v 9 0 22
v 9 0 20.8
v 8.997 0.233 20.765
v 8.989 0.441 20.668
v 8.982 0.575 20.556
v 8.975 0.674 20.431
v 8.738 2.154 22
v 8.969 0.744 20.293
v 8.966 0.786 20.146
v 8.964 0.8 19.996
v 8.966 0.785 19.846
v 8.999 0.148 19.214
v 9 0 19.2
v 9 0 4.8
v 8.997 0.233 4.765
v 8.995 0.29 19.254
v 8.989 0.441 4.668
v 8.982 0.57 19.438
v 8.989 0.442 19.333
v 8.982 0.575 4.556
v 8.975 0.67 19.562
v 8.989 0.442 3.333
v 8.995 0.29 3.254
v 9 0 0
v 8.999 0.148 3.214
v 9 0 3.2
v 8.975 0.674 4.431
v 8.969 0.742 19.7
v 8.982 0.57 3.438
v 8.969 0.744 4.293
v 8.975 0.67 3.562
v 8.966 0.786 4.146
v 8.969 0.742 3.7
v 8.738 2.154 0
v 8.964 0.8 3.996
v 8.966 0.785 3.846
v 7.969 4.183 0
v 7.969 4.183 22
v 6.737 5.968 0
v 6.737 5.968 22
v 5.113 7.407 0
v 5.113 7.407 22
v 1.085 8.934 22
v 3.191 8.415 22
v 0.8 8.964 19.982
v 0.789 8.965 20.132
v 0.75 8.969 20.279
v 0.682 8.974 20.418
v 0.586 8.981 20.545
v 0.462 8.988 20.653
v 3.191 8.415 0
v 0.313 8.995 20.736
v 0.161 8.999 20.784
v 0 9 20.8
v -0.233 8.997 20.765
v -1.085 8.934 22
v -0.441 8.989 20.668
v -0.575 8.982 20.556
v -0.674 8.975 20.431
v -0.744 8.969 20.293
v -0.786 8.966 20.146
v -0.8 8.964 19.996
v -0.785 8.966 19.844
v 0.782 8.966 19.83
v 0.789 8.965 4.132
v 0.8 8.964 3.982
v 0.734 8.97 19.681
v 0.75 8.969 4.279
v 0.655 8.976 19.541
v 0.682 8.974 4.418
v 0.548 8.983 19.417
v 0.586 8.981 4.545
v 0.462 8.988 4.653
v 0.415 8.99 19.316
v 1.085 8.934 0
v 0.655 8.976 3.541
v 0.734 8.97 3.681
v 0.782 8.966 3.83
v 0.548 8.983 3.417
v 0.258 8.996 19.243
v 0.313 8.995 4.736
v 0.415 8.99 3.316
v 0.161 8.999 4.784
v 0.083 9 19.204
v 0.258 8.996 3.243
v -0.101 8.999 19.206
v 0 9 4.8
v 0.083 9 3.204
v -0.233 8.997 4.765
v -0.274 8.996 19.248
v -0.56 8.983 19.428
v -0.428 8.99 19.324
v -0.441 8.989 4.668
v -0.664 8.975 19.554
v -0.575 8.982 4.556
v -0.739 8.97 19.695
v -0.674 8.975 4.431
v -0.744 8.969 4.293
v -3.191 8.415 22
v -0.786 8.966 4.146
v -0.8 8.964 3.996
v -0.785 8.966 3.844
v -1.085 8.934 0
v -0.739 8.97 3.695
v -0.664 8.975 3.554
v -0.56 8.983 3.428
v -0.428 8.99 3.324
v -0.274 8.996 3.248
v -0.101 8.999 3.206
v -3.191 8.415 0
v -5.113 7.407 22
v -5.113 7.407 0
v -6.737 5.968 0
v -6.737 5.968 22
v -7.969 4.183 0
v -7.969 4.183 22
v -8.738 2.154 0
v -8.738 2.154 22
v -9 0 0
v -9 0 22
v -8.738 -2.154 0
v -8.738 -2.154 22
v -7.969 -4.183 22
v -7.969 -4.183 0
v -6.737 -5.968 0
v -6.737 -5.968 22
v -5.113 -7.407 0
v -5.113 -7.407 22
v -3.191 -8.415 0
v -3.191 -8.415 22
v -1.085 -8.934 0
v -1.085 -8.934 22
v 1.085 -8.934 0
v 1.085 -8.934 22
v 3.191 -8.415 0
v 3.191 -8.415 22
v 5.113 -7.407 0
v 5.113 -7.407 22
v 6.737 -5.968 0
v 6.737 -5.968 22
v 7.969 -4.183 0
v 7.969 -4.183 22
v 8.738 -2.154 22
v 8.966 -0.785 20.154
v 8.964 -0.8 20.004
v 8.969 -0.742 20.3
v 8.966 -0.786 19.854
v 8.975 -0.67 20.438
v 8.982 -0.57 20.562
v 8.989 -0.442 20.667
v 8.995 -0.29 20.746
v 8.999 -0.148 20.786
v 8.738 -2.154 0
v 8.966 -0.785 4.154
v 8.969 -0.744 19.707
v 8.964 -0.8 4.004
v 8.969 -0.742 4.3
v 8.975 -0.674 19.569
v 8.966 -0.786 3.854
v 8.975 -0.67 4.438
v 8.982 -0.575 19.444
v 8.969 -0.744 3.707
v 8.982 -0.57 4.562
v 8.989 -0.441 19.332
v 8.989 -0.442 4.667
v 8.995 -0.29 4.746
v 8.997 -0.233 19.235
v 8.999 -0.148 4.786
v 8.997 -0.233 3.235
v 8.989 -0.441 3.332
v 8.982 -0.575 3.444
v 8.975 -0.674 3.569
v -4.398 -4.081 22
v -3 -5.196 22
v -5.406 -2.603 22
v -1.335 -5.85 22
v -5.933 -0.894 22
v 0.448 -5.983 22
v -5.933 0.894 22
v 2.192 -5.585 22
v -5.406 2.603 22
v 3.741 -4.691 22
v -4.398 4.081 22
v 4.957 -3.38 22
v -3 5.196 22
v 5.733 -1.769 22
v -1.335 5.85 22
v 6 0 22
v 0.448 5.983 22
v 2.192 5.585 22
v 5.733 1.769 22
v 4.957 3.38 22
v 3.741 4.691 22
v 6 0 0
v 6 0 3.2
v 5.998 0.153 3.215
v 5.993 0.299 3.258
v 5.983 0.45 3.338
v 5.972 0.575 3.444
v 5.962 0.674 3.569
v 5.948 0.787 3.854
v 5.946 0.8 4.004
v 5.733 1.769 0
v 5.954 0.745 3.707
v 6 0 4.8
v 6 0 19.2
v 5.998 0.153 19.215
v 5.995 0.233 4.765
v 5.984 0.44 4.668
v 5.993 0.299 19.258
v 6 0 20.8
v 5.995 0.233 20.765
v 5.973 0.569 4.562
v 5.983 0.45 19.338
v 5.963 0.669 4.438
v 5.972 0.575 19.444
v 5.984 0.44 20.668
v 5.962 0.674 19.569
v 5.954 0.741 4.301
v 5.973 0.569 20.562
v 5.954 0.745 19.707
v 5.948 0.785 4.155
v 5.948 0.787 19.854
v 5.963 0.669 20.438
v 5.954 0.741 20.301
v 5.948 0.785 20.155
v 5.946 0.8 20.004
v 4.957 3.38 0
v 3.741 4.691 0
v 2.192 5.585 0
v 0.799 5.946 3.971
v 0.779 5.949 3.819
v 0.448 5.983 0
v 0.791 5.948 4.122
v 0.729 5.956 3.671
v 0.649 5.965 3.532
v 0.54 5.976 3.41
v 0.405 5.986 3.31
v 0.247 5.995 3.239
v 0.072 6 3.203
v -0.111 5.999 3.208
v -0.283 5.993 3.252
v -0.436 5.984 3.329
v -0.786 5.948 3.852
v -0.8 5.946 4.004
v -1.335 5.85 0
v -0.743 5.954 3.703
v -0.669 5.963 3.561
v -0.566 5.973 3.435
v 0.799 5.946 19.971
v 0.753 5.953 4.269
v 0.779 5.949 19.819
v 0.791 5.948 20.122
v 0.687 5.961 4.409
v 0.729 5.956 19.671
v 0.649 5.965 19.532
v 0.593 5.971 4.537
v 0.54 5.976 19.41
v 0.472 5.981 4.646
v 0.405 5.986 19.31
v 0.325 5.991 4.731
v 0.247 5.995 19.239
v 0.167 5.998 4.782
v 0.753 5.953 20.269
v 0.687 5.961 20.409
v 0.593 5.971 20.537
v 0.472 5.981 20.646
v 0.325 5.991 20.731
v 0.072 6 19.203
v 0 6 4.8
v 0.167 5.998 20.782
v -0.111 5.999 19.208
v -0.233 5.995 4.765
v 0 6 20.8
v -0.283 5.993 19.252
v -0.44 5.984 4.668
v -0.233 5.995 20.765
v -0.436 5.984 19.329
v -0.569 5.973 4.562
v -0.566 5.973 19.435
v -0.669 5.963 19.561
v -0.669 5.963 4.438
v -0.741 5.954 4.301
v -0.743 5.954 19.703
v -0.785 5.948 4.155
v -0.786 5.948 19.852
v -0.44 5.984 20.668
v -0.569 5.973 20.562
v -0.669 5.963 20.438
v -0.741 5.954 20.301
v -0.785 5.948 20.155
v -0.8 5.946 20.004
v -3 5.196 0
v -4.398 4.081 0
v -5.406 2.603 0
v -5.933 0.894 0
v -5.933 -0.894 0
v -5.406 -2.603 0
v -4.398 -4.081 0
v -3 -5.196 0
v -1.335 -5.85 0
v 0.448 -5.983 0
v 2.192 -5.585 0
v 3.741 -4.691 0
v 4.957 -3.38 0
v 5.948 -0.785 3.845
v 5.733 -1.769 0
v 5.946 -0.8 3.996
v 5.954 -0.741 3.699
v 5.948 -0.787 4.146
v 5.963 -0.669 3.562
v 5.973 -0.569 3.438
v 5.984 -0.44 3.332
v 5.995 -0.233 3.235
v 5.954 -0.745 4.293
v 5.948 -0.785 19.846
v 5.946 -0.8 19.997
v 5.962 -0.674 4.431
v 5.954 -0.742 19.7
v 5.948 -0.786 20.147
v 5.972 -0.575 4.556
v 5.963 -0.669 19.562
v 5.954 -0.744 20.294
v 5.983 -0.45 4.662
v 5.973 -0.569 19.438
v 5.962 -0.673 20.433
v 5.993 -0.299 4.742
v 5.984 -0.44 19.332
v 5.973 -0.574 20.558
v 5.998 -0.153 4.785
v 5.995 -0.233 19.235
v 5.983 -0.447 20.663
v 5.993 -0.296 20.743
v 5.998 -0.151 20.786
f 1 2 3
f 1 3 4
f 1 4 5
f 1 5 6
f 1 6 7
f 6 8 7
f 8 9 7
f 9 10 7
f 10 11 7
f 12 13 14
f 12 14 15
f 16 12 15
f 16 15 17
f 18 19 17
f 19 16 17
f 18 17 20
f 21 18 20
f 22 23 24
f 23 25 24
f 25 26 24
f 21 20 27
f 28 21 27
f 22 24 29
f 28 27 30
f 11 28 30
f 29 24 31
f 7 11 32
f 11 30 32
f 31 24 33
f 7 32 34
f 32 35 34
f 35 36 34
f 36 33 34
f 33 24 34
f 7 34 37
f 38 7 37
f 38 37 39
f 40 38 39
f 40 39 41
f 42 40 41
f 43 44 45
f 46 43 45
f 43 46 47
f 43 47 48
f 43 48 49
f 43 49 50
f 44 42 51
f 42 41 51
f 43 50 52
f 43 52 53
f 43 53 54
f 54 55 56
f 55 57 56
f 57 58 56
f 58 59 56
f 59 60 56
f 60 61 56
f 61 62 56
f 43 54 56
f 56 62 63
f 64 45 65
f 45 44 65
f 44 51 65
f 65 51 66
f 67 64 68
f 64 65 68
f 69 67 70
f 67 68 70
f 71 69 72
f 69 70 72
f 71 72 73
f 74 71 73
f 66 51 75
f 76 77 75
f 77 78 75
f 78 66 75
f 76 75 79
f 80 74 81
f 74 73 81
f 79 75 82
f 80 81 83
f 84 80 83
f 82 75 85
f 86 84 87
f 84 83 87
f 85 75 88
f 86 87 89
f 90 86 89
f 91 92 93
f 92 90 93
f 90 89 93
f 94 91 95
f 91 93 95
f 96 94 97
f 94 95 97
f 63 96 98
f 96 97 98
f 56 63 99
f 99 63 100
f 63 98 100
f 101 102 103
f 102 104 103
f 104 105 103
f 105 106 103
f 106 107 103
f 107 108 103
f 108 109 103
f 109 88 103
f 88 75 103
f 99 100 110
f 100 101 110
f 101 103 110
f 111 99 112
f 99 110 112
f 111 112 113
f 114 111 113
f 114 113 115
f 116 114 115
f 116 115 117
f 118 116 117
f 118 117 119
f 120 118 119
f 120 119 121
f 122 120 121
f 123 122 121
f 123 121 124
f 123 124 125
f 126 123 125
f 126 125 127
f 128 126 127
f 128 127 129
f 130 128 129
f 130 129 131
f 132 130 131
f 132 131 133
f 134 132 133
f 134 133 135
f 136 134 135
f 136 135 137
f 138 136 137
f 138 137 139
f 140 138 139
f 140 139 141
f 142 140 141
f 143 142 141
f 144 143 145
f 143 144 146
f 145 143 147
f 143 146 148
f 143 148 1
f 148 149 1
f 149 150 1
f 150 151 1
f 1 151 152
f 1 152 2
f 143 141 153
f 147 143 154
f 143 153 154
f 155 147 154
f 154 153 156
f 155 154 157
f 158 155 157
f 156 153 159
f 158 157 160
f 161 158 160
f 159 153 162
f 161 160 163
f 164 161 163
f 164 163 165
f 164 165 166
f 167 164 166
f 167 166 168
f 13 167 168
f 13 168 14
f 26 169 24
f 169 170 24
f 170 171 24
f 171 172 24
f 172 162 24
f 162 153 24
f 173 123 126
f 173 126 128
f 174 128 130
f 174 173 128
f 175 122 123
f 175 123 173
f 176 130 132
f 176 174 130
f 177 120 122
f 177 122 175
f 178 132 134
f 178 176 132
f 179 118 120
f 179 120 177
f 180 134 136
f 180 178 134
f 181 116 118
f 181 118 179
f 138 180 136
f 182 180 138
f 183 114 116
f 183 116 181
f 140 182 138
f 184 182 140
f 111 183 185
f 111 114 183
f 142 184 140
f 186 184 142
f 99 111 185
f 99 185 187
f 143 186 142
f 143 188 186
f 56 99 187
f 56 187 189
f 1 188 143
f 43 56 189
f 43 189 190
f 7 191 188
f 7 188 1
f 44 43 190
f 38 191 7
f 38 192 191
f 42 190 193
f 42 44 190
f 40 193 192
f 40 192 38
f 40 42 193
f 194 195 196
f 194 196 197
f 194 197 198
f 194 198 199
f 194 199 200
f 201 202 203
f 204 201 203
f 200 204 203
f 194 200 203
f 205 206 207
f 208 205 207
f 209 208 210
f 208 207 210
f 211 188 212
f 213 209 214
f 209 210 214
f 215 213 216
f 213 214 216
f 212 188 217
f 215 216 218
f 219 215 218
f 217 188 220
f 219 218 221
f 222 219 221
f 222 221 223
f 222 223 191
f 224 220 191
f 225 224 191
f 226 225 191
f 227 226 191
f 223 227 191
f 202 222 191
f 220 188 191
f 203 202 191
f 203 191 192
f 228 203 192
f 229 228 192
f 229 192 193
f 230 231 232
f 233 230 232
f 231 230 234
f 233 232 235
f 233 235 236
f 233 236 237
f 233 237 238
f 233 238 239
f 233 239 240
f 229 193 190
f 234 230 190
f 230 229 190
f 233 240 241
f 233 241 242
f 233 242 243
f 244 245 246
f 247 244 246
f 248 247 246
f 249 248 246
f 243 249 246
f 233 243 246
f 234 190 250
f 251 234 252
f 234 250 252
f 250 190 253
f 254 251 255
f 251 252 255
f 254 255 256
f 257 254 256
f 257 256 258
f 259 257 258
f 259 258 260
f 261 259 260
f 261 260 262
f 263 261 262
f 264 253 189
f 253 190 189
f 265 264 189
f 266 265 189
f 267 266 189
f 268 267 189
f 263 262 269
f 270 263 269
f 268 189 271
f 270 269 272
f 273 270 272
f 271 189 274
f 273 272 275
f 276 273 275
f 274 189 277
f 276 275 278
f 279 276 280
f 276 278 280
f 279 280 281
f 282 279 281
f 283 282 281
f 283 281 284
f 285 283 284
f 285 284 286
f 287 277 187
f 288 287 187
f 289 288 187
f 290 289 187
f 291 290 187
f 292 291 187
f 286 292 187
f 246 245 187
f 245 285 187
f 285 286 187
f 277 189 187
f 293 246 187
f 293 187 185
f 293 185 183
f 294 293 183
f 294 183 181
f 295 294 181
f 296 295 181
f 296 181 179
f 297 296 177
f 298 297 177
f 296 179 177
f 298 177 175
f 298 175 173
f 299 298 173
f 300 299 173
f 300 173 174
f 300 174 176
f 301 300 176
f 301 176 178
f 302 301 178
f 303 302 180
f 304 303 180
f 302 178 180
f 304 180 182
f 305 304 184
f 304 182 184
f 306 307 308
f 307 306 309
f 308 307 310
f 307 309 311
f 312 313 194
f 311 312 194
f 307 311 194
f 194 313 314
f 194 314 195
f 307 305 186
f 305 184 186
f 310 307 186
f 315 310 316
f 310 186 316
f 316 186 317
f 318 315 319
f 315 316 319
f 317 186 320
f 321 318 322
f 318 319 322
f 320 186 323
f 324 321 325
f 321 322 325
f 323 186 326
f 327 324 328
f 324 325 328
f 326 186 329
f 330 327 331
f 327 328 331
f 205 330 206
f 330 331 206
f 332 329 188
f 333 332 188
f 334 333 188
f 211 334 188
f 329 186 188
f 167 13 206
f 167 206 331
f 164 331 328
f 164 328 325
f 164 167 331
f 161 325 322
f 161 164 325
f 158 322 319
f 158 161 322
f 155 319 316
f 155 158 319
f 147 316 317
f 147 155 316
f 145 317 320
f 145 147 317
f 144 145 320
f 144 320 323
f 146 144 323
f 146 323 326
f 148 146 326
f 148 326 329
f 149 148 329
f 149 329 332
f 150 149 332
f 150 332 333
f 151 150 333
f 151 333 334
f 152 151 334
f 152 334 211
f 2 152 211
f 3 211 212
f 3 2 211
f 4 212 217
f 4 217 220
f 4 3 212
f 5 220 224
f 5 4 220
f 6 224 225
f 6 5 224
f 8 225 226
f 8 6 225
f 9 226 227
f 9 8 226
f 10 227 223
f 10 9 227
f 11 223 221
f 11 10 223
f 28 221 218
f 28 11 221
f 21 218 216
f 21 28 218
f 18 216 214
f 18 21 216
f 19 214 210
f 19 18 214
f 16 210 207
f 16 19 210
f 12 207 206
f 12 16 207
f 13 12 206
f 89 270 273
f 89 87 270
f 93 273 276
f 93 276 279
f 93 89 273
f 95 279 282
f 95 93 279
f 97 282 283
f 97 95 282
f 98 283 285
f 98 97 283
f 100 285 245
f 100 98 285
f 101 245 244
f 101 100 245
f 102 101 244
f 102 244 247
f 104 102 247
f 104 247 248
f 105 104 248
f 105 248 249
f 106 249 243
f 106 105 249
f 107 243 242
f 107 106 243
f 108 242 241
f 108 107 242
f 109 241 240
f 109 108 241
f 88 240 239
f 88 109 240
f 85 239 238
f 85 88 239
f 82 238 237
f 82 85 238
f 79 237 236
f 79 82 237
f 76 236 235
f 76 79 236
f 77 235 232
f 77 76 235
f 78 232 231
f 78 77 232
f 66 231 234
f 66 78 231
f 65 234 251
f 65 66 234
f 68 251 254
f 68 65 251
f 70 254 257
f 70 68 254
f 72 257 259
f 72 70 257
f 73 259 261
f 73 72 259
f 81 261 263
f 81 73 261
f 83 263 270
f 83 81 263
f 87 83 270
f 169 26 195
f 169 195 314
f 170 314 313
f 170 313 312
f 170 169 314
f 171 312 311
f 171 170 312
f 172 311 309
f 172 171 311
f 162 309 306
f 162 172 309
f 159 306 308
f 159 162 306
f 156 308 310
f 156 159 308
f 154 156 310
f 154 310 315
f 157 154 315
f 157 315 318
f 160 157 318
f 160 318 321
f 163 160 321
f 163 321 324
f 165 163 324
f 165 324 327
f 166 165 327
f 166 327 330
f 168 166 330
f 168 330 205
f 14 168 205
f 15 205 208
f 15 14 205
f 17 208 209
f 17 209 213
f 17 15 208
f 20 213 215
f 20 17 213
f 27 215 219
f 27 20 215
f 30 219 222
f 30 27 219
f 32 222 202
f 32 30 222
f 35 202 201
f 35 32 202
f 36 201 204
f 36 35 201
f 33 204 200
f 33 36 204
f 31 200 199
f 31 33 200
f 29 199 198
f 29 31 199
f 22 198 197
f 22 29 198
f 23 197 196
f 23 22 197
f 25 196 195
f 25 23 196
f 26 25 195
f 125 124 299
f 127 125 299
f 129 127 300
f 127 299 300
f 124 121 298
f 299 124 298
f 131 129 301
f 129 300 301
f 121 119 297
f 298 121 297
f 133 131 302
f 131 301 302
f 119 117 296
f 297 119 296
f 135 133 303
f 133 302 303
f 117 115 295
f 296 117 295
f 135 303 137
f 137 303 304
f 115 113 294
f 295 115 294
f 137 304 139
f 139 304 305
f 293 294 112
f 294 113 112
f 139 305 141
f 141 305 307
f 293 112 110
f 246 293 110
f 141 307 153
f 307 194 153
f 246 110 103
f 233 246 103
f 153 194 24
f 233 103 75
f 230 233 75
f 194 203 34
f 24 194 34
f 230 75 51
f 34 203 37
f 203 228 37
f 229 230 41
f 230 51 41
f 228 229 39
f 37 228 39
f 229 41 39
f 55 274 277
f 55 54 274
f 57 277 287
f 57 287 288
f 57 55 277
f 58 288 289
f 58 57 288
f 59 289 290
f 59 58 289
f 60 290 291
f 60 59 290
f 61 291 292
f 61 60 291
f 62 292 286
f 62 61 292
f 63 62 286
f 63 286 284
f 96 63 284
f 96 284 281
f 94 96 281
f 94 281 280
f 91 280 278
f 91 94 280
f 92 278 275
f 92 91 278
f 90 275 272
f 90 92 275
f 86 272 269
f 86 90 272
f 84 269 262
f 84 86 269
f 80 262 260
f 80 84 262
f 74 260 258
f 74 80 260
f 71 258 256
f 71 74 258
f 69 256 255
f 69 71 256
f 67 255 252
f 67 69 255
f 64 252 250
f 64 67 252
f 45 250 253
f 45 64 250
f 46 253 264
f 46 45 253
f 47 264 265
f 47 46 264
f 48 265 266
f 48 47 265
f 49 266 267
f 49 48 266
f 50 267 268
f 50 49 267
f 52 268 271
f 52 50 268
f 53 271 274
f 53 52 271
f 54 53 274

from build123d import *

# Parameters (mm, degrees)
SKIZZE1_R                       = 9
AUFSATZ_LINEAR_AUSTRAGEN1_DEPTH = 22
SKIZZE2_R                       = 6
SCHNITT_LINEAR_AUSTRAGEN1_DEPTH = 26.416530054
LINEARES_MUSTER1_COUNT          = 2
LINEARES_MUSTER1_PITCH          = 16
LINEARES_MUSTER2_COUNT          = 2
LINEARES_MUSTER2_PITCH          = 16


with BuildPart() as part:
    # Skizze1 → Aufsatz-Linear austragen1 (new body)
    with BuildSketch(Plane.XY):
        Circle(SKIZZE1_R)
    extrude(amount=AUFSATZ_LINEAR_AUSTRAGEN1_DEPTH)

    # Skizze2 → Schnitt-Linear austragen1 (cut, through all)
    with BuildSketch(Plane.XY.offset(22)):
        Circle(SKIZZE2_R)
    extrude(amount=-SCHNITT_LINEAR_AUSTRAGEN1_DEPTH, mode=Mode.SUBTRACT)

    # Skizze4 → M2 Gewindebohrung1 (revolve, cut)
    with BuildSketch(Plane(origin=(9, 0, 4), x_dir=(0, 0, -1), z_dir=(0, 1, 0))):
        Polygon((0, 0), (0, 6.480688495), (0.8, 6), (0.8, 0), align=None)
    m2_gewindebohrung1 = revolve(axis=Axis((15.35, 0, 4), (-1, 0, 0)), mode=Mode.SUBTRACT)

    # Skizze6 → M2 Gewindebohrung2 (revolve, cut)
    with BuildSketch(Plane(origin=(0, 9, 4), x_dir=(0, 0, 1), z_dir=(1, 0, 0))):
        Polygon((0, 0), (0, 6.480688495), (0.8, 6), (0.8, 0), align=None)
    m2_gewindebohrung2 = revolve(axis=Axis((0, 15.35, 4), (0, -1, 0)), mode=Mode.SUBTRACT)

    # Lineares Muster1: M2 Gewindebohrung1 ×2
    with Locations(*[(0, 0, i * LINEARES_MUSTER1_PITCH) for i in range(1, LINEARES_MUSTER1_COUNT)]):
        add(m2_gewindebohrung1, mode=Mode.SUBTRACT)

    # Lineares Muster2: M2 Gewindebohrung2 ×2
    with Locations(*[(0, 0, i * LINEARES_MUSTER2_PITCH) for i in range(1, LINEARES_MUSTER2_COUNT)]):
        add(m2_gewindebohrung2, mode=Mode.SUBTRACT)


solid = part.part
